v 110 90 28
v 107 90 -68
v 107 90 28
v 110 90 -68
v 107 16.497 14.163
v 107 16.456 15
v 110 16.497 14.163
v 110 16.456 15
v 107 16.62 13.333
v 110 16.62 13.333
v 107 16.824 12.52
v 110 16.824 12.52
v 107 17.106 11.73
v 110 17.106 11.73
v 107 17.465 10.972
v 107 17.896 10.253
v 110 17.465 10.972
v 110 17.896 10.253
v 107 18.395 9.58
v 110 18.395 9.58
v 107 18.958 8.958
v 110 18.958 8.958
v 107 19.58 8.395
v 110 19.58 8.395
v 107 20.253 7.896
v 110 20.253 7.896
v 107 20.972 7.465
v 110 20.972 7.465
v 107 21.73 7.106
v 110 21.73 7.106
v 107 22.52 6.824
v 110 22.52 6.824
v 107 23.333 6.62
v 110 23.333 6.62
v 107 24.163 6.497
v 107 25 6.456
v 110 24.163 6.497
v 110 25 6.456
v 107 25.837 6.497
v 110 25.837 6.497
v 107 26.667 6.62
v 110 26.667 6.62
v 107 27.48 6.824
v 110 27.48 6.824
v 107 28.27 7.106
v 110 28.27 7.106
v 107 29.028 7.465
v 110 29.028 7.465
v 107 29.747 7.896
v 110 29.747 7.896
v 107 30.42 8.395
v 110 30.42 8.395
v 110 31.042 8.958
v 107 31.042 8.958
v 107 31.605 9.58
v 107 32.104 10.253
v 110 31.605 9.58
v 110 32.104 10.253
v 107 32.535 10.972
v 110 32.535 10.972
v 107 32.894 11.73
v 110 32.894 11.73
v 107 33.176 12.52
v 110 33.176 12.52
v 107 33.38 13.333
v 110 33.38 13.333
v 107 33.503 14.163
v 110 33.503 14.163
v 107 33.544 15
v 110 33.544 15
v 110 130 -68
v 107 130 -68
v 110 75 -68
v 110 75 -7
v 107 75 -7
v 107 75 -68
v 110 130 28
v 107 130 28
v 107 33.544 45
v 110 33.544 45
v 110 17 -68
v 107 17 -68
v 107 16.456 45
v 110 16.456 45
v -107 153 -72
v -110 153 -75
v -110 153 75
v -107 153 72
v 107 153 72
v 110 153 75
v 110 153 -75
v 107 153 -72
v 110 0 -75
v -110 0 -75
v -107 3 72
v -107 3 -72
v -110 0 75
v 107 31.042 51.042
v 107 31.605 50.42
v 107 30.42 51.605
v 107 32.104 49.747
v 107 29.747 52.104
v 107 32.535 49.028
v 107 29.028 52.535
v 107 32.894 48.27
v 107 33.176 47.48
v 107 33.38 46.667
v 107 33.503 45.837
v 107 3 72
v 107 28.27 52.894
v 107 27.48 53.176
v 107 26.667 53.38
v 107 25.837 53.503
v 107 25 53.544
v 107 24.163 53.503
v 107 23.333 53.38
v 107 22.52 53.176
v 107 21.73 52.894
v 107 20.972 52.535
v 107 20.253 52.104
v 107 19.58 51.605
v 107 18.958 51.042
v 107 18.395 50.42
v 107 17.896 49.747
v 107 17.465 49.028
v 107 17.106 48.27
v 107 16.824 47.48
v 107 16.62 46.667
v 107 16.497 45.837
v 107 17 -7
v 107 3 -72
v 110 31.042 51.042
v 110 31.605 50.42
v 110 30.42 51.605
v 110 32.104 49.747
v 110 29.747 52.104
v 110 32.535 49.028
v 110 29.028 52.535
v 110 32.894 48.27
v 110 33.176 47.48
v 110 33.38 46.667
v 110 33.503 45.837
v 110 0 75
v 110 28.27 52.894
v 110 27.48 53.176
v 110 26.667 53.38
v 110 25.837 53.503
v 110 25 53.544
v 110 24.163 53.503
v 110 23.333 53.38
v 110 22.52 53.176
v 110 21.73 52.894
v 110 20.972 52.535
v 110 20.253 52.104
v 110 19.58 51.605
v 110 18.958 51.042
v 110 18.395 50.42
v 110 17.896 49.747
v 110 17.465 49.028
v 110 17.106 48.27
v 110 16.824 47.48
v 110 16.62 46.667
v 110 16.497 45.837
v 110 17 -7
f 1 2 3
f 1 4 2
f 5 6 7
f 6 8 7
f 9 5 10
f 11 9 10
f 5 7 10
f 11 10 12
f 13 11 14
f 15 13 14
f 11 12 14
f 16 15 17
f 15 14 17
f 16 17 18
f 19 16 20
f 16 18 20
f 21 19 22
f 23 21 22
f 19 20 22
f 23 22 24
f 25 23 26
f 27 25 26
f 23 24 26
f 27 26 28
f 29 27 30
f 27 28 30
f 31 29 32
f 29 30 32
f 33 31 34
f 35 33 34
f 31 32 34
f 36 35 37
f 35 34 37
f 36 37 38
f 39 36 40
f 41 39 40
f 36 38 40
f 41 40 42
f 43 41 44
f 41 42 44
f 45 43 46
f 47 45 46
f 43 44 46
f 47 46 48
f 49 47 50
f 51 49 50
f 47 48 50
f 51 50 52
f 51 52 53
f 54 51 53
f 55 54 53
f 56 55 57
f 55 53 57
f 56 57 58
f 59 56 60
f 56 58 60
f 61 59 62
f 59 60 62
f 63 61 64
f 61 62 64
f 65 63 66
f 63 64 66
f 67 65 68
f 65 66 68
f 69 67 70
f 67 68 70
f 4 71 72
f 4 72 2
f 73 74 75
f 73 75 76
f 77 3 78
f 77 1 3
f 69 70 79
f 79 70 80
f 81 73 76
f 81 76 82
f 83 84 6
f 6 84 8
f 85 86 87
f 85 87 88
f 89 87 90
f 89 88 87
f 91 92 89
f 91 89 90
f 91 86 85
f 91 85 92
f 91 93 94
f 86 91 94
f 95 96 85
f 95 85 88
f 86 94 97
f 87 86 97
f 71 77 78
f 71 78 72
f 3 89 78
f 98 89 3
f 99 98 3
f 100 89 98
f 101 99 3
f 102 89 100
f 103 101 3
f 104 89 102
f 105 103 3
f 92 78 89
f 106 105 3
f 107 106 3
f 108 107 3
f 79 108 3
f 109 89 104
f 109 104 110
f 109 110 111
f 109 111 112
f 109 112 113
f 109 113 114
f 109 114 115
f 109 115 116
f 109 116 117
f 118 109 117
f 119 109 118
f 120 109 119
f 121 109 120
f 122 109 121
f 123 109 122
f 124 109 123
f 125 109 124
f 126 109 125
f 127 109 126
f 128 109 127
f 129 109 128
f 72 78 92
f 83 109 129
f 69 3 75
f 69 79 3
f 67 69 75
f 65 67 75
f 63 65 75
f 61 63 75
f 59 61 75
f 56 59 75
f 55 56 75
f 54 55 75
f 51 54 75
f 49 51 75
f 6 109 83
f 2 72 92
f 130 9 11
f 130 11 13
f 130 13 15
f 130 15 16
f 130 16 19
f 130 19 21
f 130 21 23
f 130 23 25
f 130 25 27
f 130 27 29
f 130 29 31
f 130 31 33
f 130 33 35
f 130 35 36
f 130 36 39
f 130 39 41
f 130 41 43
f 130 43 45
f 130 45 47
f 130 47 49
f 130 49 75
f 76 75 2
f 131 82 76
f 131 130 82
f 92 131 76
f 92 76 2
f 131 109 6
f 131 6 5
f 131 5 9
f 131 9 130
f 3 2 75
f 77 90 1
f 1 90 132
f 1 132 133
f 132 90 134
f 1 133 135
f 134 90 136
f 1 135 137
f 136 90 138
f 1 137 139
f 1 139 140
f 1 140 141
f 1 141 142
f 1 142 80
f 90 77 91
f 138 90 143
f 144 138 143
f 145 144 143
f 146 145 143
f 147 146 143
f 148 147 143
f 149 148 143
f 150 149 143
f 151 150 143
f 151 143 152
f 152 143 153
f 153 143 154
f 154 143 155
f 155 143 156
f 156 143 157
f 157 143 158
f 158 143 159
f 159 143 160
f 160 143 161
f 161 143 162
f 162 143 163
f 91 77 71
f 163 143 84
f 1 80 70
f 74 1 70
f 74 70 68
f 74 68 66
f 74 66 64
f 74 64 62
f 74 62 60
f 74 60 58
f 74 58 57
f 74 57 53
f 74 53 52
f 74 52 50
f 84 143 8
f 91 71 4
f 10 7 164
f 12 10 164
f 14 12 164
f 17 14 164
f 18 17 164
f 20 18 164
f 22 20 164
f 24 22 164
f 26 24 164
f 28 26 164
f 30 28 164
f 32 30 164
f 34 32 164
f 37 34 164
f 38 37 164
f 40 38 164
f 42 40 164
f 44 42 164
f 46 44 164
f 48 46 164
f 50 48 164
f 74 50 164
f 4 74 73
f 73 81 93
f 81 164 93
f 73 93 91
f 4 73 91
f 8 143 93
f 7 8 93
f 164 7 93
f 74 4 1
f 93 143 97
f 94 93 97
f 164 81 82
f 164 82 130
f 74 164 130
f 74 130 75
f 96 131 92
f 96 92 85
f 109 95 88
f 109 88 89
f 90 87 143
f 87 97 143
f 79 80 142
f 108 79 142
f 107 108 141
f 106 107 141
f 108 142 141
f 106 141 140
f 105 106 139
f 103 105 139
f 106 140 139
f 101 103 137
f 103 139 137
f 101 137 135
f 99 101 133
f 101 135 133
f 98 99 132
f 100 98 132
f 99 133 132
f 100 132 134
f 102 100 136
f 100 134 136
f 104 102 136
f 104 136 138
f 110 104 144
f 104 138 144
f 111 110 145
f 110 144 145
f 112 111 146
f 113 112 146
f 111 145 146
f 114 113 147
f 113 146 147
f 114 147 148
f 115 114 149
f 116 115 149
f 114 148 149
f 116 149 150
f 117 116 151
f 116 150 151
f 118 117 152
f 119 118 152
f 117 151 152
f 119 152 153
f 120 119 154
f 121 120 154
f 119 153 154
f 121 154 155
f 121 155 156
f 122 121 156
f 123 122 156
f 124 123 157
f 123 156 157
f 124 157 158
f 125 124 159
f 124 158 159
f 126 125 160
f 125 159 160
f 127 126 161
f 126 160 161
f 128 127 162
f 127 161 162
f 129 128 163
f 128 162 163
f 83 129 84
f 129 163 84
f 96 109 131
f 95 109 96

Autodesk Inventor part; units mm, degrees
ref_plane "YZ Plane" through (0, 0, 0) normal (1, 0, 0) x (0, 1, 0)
ref_plane "XZ Plane" through (0, 0, 0) normal (0, 1, 0) x (-1, 0, 0)
ref_plane "XY Plane" through (0, 0, 0) normal (0, 0, 1) x (1, 0, 0)
sketch "Sketch1" plane through (0, 0, 0) normal (0, 1, 0) x (-1, 0, 0)
  line L0 (110, 75) -> (-110, 75)
  line L1 (-110, 75) -> (-110, -75)
  line L2 (-110, -75) -> (110, -75)
  line L3 (110, -75) -> (110, 75)
  line L4 (110, 75) -> (-110, -75) construction
  line L5 (-110, 75) -> (110, -75) construction
  point P0 (0, 0)
  dimension "d0" = 150
  dimension "d1" = 220
extrude "Extrusion1" add sketch "Sketch1" along normal blind 3
sketch "Sketch2" plane through (0, 3, 0) normal (0, 1, 0) x (1, 0, 0)
  line L0 (110, -75) -> (110, 75) projected
  line L1 (-110, -75) -> (110, -75)
  line L2 (110, -75) -> (110, 75)
  line L3 (110, 75) -> (-110, 75)
  line L4 (-110, 75) -> (-110, -75)
  line L5 (-110, -75) -> (110, 75) construction
  line L6 (110, -75) -> (-110, 75) construction
  line L7 (-107, -72) -> (107, -72)
  line L8 (107, -72) -> (107, 72)
  line L9 (107, 72) -> (-107, 72)
  line L10 (-107, 72) -> (-107, -72)
  line L11 (-107, -72) -> (107, 72) construction
  line L12 (107, -72) -> (-107, 72) construction
  point P0 (0, 0)
  dimension "d4" = 144
  dimension "d5" = 214
extrude "Extrusion2" add sketch "Sketch2" along normal blind 150
sketch "Sketch3" plane through (110, 0, 75) normal (1, 0, 0) x (0, 0, -1)
  line L0 (47, 130) -> (143, 130)
  line L1 (143, 130) -> (143, 90)
  line L2 (143, 90) -> (47, 90)
  line L3 (47, 90) -> (47, 130)
  line L4 (47, 130) -> (143, 90) construction
  line L5 (143, 130) -> (47, 90) construction
  line L6 (0, 0) -> (0, 153) projected
  line L7 (82, 75) -> (143, 75)
  line L8 (143, 75) -> (143, 17)
  line L9 (143, 17) -> (82, 17)
  line L10 (82, 17) -> (82, 75)
  line L11 (82, 75) -> (143, 17) construction
  line L12 (143, 75) -> (82, 17) construction
  line L13 (30, 25) -> (60, 25) construction
  line L14 (30, 16.456) -> (60, 16.456)
  line L15 (60, 33.544) -> (30, 33.544)
  arc A0 (30, 33.544) -> (30, 16.456) centre (30, 25) ccw
  arc A1 (60, 16.456) -> (60, 33.544) centre (60, 25) ccw
  point P0 (75, 0)
  point P1 (95, 110)
  point P2 (112.5, 46)
  point P3 (0, 3)
  point P4 (45, 25)
  dimension "d8" = 96
  dimension "d9" = 40
  dimension "d10" = 95
  dimension "d11" = 110
  dimension "d14" = 61
  dimension "d15" = 58
  dimension "d16" = 0
  dimension "d17" = 46
  dimension "d18" = 25
  dimension "d19" = 30
  dimension "d20" = 30
  dimension "d21" = 8.544
extrude "Extrusion3" cut sketch "Sketch3" against normal blind 3
properties part number "perspex_shell"
